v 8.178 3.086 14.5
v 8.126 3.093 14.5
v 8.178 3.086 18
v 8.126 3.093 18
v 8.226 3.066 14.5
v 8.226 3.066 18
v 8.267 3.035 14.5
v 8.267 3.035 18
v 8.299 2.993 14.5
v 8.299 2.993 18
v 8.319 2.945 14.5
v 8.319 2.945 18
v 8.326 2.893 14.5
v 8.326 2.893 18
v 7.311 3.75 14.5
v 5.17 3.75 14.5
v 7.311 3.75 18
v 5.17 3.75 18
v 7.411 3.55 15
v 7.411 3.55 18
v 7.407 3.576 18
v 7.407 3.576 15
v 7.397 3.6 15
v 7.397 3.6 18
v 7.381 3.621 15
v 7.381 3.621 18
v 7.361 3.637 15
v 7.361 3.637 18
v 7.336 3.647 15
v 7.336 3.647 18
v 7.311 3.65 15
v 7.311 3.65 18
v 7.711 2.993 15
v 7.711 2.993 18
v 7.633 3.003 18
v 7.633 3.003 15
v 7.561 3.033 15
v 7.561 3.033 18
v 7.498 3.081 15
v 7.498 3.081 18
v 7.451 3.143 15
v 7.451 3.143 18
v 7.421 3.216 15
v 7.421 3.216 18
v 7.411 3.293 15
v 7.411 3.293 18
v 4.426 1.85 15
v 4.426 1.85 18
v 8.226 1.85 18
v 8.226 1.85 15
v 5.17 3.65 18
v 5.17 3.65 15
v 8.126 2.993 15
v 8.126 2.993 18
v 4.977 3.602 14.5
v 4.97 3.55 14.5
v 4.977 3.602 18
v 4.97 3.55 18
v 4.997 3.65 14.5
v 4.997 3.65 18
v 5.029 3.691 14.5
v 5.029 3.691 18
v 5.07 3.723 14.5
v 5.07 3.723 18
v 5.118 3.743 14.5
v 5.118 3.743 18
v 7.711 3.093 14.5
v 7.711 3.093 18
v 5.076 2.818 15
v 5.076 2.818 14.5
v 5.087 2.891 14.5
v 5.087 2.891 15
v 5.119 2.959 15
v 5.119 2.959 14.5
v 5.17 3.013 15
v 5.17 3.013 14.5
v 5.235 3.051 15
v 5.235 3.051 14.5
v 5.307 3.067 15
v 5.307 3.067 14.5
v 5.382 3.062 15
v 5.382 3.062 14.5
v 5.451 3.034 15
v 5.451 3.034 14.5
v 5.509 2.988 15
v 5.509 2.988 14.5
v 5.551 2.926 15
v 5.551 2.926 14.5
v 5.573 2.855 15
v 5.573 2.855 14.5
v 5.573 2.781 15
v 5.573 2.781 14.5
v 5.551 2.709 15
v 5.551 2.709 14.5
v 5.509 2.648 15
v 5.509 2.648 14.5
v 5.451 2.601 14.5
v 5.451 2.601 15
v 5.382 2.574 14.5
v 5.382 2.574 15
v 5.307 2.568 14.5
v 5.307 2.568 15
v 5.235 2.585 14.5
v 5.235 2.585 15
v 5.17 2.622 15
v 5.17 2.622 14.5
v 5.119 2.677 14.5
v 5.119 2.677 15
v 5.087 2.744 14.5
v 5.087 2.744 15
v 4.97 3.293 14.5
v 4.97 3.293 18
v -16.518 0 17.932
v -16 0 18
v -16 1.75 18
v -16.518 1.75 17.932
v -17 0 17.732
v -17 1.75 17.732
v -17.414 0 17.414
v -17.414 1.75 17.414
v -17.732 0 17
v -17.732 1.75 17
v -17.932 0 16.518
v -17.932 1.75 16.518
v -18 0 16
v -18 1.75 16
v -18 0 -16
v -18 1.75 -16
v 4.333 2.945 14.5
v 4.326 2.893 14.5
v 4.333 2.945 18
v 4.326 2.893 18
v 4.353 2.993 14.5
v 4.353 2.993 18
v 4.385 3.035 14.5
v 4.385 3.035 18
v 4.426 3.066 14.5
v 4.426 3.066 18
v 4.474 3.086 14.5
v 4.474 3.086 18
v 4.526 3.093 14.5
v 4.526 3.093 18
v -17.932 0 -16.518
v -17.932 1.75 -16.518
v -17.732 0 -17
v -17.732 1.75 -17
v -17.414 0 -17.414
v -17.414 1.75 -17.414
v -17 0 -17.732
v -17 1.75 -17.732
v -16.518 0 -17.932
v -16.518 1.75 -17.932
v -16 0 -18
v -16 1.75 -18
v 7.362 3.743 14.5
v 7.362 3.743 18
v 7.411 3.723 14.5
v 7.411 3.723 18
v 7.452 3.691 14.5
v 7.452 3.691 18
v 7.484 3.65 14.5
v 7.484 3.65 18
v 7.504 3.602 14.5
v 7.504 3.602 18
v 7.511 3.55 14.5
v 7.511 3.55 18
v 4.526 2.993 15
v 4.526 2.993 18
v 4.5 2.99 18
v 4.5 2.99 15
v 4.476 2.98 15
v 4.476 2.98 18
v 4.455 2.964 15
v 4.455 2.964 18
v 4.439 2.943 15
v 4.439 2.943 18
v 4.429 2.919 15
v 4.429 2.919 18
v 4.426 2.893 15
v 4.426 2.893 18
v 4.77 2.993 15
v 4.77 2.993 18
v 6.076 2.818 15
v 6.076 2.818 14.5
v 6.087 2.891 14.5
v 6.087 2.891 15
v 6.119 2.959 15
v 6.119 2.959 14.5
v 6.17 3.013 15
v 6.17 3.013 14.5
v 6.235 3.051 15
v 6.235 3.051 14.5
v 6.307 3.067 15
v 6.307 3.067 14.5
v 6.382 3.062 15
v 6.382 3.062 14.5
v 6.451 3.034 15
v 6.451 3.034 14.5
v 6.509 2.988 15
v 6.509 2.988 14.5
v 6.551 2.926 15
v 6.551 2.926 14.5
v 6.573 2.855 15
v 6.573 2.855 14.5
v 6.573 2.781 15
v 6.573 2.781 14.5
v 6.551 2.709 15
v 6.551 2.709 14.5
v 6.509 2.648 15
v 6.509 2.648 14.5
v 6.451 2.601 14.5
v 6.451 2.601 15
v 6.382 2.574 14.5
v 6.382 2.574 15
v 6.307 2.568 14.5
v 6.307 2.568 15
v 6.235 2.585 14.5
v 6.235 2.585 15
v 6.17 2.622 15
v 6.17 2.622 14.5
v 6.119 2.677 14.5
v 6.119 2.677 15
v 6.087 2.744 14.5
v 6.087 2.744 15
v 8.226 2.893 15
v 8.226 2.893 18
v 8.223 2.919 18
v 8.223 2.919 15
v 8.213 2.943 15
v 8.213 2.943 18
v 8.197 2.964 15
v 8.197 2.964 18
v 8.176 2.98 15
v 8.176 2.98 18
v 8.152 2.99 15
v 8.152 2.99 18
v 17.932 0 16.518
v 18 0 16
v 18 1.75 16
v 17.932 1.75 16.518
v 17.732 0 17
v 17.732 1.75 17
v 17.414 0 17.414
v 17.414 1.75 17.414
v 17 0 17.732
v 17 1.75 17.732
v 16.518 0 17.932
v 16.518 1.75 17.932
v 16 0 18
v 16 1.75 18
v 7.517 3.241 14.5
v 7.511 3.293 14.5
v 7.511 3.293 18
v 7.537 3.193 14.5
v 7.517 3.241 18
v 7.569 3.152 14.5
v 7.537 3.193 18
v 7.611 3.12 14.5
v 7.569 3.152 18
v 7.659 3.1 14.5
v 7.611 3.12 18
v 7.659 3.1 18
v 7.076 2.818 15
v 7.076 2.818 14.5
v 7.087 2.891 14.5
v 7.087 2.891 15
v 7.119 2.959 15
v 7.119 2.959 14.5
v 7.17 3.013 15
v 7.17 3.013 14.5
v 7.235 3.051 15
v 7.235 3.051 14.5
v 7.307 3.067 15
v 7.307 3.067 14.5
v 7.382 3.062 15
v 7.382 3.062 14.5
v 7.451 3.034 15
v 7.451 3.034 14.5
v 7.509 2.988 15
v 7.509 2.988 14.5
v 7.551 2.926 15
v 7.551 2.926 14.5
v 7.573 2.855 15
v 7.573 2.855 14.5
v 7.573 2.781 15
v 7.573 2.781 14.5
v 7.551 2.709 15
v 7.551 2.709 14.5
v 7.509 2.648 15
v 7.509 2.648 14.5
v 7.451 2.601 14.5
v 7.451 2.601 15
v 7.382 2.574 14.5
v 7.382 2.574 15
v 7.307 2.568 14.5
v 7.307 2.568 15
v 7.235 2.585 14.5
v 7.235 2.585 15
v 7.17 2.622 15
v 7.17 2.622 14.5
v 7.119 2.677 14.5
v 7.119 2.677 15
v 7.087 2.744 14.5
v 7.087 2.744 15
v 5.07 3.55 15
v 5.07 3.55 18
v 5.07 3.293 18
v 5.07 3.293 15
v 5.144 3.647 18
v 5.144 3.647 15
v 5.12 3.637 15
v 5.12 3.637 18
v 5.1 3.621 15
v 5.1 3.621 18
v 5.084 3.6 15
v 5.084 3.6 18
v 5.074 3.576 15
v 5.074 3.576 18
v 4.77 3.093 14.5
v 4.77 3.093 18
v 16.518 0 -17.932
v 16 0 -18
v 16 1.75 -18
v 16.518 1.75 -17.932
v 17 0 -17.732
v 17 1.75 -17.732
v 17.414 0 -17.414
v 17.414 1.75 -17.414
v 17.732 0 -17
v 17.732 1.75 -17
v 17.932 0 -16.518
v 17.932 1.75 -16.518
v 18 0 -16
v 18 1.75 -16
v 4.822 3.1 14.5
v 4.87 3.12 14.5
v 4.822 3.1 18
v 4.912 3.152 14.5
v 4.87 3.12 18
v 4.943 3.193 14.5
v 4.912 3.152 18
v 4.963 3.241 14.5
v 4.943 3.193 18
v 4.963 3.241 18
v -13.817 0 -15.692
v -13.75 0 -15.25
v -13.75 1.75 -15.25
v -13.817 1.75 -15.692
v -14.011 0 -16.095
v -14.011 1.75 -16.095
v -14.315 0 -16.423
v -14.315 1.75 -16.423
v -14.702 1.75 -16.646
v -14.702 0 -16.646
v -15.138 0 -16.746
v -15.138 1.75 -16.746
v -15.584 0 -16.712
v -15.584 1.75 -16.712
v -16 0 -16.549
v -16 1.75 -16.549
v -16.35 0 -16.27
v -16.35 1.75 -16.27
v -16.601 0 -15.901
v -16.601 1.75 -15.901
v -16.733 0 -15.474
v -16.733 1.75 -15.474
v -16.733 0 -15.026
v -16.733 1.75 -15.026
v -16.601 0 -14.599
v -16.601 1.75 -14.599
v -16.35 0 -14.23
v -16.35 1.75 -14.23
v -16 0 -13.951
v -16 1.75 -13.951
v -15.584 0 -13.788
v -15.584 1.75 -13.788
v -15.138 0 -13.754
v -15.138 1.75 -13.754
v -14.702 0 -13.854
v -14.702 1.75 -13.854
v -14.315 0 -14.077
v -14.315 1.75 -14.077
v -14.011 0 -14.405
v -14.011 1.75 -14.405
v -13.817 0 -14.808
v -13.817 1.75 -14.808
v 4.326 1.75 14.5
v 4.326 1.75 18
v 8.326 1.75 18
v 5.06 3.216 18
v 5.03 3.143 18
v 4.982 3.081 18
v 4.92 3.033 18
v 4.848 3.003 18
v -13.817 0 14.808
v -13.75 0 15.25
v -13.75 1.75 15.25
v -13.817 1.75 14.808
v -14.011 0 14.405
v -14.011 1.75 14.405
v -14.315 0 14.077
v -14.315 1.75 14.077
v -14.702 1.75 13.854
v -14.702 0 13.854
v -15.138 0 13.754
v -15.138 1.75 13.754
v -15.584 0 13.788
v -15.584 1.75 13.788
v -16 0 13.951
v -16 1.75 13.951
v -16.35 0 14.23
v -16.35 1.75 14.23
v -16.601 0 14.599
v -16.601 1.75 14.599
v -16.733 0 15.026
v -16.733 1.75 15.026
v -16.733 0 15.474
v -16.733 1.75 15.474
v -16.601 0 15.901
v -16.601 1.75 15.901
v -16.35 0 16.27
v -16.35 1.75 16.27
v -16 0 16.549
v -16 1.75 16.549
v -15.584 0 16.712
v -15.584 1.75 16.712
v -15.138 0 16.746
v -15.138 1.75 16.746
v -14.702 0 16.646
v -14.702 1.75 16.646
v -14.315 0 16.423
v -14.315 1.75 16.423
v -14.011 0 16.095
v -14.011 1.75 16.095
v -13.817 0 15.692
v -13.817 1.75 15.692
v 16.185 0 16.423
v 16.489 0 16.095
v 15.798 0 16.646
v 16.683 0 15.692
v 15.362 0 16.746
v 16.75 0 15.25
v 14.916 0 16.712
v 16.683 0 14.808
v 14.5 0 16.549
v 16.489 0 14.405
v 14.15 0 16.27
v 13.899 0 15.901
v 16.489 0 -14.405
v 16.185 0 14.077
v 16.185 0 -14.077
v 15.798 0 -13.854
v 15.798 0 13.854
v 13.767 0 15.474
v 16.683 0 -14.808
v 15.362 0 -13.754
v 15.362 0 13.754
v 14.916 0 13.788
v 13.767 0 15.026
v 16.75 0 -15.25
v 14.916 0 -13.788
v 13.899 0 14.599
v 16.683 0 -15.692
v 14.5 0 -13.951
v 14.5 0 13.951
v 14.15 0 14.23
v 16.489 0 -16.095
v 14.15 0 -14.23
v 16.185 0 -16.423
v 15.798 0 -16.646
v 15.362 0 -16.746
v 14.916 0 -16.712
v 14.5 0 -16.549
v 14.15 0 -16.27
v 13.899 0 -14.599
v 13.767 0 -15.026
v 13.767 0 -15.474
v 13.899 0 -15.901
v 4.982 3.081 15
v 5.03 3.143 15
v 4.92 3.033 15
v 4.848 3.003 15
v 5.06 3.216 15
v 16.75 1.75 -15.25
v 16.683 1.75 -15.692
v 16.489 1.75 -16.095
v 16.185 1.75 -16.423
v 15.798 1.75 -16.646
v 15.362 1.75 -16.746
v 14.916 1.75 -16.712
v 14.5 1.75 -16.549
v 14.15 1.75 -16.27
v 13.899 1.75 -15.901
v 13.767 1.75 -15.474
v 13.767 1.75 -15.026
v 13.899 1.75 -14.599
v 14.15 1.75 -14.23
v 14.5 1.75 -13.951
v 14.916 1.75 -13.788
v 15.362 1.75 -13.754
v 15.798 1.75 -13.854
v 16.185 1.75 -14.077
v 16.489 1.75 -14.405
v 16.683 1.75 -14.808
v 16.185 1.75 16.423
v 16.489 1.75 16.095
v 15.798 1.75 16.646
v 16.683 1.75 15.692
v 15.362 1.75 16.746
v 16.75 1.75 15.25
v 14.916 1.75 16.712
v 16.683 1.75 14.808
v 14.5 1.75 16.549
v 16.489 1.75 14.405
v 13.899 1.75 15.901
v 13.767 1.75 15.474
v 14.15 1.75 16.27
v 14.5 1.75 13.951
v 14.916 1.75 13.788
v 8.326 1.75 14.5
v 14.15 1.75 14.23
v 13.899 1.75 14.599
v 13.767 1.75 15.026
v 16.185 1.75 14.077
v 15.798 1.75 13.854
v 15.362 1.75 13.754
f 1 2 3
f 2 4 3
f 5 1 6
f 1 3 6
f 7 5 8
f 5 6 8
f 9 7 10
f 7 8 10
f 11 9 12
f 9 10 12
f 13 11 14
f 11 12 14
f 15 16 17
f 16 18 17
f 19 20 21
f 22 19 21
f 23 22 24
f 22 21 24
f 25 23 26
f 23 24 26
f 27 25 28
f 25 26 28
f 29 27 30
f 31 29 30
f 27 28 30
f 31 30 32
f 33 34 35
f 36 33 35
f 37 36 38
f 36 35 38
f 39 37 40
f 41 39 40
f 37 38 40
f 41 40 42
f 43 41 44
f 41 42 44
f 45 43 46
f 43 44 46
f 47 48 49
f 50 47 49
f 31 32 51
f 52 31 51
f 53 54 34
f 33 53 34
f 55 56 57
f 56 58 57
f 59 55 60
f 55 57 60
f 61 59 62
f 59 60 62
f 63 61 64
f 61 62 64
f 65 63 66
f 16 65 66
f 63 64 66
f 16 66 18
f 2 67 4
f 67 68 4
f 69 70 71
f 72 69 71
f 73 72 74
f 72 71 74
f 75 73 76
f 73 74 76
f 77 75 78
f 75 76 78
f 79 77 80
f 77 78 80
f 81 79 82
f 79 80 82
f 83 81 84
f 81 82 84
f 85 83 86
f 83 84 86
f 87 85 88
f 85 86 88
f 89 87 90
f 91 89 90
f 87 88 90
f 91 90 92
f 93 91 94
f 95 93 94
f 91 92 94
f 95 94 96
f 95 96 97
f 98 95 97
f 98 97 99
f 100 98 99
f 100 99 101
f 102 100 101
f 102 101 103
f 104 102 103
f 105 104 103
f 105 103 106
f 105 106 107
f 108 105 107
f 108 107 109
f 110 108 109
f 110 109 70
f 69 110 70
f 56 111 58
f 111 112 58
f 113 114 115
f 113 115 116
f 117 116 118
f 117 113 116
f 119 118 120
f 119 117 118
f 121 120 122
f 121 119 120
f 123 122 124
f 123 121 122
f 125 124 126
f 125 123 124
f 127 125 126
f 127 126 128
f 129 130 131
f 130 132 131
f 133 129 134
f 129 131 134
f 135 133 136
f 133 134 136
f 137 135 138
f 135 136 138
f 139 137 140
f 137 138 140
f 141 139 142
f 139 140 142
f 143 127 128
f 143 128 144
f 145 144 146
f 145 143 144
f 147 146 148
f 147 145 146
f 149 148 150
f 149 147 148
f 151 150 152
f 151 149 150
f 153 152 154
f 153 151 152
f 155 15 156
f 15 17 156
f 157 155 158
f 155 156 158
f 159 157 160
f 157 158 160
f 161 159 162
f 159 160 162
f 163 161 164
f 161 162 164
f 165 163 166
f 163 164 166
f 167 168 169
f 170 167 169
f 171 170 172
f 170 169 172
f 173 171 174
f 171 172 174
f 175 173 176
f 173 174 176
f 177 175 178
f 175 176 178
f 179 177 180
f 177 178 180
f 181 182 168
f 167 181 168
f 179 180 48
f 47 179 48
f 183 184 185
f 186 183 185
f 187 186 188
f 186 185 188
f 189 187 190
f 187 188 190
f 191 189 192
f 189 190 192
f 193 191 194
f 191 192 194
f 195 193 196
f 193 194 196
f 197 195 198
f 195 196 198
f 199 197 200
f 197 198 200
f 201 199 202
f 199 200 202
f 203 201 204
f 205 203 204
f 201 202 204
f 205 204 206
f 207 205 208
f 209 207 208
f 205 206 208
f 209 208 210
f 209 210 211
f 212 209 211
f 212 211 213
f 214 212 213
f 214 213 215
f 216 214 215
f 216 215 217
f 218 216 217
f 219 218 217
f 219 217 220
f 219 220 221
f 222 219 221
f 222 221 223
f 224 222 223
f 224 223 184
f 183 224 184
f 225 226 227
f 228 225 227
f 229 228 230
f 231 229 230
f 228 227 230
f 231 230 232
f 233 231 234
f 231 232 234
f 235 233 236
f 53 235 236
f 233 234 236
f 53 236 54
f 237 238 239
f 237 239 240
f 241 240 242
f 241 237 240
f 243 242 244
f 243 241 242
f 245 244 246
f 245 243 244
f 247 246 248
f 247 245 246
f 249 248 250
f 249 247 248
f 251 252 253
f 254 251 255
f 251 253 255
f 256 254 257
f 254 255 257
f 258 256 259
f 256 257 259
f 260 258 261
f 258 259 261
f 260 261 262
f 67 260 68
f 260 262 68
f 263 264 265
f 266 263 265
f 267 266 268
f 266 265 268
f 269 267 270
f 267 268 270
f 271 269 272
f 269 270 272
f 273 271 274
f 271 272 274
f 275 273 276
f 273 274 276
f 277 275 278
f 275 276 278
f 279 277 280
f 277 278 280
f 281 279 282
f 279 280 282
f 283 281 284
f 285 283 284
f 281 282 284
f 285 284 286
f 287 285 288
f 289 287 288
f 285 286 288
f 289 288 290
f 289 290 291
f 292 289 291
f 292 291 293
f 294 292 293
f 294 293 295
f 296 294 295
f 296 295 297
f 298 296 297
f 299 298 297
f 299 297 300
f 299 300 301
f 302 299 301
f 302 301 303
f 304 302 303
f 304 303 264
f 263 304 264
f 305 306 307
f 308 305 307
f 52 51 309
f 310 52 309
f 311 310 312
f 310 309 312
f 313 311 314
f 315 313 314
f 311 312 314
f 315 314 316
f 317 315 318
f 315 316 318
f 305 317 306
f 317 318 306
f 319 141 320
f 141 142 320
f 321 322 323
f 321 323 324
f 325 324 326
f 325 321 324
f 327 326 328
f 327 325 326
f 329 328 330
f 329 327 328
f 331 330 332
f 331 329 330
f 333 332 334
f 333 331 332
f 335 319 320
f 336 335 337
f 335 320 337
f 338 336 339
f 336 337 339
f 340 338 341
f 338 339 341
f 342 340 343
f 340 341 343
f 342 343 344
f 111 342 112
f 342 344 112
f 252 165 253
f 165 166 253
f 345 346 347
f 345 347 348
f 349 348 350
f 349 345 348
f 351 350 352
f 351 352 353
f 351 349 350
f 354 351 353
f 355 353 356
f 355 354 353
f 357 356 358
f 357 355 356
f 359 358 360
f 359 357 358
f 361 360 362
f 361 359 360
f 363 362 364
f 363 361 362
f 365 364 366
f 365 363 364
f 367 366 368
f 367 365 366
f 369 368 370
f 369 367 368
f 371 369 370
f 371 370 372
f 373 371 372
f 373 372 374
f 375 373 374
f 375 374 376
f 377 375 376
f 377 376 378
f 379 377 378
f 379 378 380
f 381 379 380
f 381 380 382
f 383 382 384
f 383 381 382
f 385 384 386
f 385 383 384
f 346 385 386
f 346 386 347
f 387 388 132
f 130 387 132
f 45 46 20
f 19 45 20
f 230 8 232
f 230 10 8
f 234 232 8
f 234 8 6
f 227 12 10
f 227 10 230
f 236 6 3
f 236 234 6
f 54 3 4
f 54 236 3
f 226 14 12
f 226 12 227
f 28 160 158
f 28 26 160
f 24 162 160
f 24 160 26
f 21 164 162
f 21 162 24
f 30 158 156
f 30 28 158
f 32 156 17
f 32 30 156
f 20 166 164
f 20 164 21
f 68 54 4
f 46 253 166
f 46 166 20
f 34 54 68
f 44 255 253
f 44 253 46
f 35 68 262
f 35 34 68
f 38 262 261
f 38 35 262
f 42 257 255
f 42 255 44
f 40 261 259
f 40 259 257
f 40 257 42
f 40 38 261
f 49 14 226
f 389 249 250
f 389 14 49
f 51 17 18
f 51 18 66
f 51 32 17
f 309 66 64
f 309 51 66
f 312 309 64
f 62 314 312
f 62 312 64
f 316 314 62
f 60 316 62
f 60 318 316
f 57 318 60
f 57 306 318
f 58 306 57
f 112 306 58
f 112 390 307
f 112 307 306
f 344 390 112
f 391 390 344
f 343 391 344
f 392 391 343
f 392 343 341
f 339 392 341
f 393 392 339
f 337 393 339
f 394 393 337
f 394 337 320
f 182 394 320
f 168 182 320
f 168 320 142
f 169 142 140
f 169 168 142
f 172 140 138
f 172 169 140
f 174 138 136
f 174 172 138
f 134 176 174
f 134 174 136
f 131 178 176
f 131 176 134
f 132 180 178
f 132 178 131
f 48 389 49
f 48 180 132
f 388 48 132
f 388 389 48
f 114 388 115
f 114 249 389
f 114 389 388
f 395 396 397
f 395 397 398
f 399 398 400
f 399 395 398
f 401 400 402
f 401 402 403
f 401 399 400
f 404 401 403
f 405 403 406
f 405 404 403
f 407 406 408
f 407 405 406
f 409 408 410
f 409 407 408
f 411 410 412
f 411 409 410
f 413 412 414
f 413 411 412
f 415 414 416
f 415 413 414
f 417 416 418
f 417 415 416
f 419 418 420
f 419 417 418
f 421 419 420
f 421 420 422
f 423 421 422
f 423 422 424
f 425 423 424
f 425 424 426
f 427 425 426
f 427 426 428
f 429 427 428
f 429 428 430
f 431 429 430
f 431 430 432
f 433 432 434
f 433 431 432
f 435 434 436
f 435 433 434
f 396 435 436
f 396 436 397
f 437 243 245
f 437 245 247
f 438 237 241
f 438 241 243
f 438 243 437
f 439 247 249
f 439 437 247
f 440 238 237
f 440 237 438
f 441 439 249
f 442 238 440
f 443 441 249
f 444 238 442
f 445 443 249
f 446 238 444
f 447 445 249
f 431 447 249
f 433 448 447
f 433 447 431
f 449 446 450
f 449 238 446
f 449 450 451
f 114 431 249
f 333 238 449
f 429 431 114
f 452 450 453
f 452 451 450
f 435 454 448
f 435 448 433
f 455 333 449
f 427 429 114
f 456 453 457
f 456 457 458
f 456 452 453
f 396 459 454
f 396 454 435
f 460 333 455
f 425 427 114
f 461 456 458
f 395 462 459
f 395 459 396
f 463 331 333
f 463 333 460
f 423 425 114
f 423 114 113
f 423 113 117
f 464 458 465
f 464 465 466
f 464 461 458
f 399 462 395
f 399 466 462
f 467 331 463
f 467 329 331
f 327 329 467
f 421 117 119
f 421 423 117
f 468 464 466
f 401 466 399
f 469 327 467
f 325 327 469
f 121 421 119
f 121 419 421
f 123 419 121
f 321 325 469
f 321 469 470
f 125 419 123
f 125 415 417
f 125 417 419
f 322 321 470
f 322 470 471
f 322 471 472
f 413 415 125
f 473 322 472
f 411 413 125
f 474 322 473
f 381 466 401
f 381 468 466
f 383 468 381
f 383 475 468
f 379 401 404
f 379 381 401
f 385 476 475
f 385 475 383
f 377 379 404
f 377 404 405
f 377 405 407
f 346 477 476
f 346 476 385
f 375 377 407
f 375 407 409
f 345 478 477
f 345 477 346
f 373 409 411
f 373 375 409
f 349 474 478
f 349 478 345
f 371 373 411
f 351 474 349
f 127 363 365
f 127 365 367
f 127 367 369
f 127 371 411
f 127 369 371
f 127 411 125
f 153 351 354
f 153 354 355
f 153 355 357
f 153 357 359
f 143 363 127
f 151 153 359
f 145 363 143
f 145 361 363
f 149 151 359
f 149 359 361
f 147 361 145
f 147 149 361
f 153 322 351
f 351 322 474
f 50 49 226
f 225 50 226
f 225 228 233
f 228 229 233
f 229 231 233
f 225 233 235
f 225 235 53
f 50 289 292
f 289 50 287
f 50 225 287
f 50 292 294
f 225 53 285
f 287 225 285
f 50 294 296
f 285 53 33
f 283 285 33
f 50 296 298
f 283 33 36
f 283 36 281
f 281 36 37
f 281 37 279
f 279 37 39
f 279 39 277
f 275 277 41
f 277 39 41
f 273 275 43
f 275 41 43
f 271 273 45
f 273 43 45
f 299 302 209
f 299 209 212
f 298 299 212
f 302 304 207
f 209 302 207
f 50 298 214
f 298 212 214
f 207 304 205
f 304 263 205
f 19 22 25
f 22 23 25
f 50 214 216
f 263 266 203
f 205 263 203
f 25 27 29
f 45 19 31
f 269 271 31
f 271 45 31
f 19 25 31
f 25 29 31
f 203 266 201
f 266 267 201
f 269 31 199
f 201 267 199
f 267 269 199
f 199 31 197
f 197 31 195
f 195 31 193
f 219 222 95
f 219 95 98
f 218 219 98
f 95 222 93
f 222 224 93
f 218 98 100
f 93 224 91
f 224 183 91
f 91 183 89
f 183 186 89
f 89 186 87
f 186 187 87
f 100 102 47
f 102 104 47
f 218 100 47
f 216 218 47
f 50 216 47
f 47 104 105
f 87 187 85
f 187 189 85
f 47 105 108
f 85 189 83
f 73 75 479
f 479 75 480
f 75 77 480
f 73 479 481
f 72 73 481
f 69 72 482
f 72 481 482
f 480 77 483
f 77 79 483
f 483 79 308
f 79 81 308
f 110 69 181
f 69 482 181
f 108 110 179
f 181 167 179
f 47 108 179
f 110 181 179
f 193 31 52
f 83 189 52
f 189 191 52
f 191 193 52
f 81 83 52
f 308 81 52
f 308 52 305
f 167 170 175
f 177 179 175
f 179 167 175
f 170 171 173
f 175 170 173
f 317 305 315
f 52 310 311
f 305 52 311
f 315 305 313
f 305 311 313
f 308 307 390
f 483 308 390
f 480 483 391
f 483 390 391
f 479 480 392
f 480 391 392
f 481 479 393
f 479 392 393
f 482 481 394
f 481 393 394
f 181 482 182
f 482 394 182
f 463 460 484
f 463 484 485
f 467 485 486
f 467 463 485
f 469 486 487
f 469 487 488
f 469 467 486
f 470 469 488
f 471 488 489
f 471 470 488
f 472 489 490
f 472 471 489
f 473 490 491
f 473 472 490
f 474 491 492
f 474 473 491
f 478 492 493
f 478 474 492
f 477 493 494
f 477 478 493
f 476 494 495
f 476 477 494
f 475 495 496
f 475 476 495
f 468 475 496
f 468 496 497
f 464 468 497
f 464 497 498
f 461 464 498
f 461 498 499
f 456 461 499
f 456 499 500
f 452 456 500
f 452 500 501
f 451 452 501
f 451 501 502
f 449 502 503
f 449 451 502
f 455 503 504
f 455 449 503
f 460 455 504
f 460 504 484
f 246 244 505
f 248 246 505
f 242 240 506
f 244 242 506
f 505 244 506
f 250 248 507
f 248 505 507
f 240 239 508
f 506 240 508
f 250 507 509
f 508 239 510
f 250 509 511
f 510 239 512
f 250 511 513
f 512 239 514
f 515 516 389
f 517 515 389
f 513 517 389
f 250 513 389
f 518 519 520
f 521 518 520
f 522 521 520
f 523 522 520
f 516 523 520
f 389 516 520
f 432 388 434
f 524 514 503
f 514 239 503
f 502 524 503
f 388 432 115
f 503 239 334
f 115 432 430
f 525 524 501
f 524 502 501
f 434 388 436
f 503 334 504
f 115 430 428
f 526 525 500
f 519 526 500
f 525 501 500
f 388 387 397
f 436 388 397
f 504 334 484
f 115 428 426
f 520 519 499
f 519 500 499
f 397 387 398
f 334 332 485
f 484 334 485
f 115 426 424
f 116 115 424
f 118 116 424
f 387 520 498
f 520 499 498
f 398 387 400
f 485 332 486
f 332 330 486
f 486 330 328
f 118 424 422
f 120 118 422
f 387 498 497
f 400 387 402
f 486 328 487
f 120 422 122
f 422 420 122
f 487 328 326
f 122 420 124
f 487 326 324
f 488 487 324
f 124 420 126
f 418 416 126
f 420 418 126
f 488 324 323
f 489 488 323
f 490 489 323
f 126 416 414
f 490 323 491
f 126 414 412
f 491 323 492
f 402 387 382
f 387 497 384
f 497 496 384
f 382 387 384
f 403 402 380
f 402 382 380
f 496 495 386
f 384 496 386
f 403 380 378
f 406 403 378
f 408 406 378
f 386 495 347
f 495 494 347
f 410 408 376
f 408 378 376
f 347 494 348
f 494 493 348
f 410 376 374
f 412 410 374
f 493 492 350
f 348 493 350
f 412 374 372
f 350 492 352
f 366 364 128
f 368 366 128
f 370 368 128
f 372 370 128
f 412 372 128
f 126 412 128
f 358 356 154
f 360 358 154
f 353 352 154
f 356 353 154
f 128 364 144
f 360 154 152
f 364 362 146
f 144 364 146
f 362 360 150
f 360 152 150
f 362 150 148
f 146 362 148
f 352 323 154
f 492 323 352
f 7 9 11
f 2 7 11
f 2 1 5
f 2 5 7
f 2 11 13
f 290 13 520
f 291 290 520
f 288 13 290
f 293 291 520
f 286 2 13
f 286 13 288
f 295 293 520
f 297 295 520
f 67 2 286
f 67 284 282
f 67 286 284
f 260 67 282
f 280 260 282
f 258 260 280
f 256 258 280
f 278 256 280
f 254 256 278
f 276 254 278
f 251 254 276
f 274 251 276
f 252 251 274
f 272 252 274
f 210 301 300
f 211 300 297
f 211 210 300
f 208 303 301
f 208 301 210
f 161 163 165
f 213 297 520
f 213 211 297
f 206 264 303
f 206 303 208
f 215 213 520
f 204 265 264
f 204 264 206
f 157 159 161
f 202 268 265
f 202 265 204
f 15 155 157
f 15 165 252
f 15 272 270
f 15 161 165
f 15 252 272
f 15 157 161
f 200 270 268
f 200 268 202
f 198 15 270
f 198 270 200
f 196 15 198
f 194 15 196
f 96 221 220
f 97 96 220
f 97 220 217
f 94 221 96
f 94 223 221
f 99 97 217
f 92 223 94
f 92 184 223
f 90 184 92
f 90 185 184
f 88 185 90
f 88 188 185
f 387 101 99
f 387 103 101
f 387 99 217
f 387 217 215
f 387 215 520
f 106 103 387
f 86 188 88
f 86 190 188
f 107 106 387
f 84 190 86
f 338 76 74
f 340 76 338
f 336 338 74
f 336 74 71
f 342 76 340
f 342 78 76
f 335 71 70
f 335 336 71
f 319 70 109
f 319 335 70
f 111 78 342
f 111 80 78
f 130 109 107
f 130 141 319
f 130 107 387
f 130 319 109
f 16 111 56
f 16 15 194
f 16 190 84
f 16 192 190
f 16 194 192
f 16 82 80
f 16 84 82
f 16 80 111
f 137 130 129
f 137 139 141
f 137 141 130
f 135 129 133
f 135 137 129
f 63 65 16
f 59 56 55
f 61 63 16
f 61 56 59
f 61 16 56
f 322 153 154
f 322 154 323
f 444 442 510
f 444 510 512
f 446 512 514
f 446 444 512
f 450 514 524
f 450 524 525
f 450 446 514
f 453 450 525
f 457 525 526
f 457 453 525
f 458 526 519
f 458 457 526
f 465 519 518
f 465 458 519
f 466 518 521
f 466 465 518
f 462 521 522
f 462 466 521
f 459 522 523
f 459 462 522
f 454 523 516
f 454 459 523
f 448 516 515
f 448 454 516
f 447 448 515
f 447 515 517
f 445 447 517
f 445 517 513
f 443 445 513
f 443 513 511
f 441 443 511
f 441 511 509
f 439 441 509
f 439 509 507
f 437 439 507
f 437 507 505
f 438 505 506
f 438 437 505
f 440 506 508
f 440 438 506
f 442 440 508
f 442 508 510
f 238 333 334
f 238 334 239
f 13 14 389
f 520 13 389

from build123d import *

# Parameters (mm, degrees)
SKETCH1_R           = 1.5
BOSS_EXTRUDE1_DEPTH = 1.75
BOSS_EXTRUDE2_DEPTH = 3
BOSS_EXTRUDE3_DEPTH = 0.5
CUT_EXTRUDE1_REACH  = 5.5
SKETCH4_R           = 0.25


with BuildPart() as part:
    # Sketch1 → Boss-Extrude1 (new body)
    with BuildSketch(Plane(origin=(0, 0, 0), x_dir=(1, 0, 0), z_dir=(0, 1, 0))):
        with BuildLine():
            Line((16, -18), (-16, -18))
            ThreePointArc((-16, -18), (-17.414213562, -17.414213562), (-18, -16))
            Line((-18, -16), (-18, 16))
            ThreePointArc((-18, 16), (-17.414213562, 17.414213562), (-16, 18))
            Line((-16, 18), (16, 18))
            ThreePointArc((16, 18), (17.414213562, 17.414213562), (18, 16))
            Line((18, 16), (18, -16))
            ThreePointArc((18, -16), (17.414213562, -17.414213562), (16, -18))
        make_face()
        with Locations((-15.25, 15.25)):
            Circle(SKETCH1_R, mode=Mode.SUBTRACT)
        with Locations((15.25, 15.25)):
            Circle(SKETCH1_R, mode=Mode.SUBTRACT)
        with Locations((15.25, -15.25)):
            Circle(SKETCH1_R, mode=Mode.SUBTRACT)
        with Locations((-15.25, -15.25)):
            Circle(SKETCH1_R, mode=Mode.SUBTRACT)
    extrude(amount=BOSS_EXTRUDE1_DEPTH)

    # Sketch2 → Boss-Extrude2 (add)
    with BuildSketch(Plane.XY.offset(18)):
        with BuildLine():
            Line((4.325932744, 1.75), (8.325932744, 1.75))
            Line((8.325932744, 1.75), (8.325932744, 2.893191045))
            ThreePointArc((8.325932744, 2.893191045), (8.2673541, 3.034612401), (8.125932744, 3.093191045))
            Line((8.125932744, 3.093191045), (7.710555572, 3.093191045))
            ThreePointArc((7.710555572, 3.093191045), (7.569134216, 3.151769689), (7.510555572, 3.293191045))
            Line((7.510555572, 3.293191045), (7.510555572, 3.55))
            ThreePointArc((7.510555572, 3.55), (7.451976928, 3.691421356), (7.310555572, 3.75))
            Line((7.310555572, 3.75), (5.170220599, 3.75))
            ThreePointArc((5.170220599, 3.75), (5.028799243, 3.691421356), (4.970220599, 3.55))
            Line((4.970220599, 3.55), (4.970220599, 3.293191045))
            ThreePointArc((4.970220599, 3.293191045), (4.911641955, 3.151769689), (4.770220599, 3.093191045))
            Line((4.770220599, 3.093191045), (4.525932744, 3.093191045))
            ThreePointArc((4.525932744, 3.093191045), (4.384511387, 3.034612401), (4.325932744, 2.893191045))
            Line((4.325932744, 2.893191045), (4.325932744, 1.75))
        make_face()
        with BuildLine():
            Line((4.425932744, 1.85), (8.225932744, 1.85))
            Line((8.225932744, 1.85), (8.225932744, 2.893191045))
            ThreePointArc((8.225932744, 2.893191045), (8.196643422, 2.963901723), (8.125932744, 2.993191045))
            Line((8.125932744, 2.993191045), (7.710555572, 2.993191045))
            ThreePointArc((7.710555572, 2.993191045), (7.498423538, 3.081059011), (7.410555572, 3.293191045))
            Line((7.410555572, 3.293191045), (7.410555572, 3.55))
            ThreePointArc((7.410555572, 3.55), (7.38126625, 3.620710678), (7.310555572, 3.65))
            Line((7.310555572, 3.65), (5.170220599, 3.65))
            ThreePointArc((5.170220599, 3.65), (5.099509921, 3.620710678), (5.070220599, 3.55))
            Line((5.070220599, 3.55), (5.070220599, 3.293191045))
            ThreePointArc((5.070220599, 3.293191045), (4.982352633, 3.081059011), (4.770220599, 2.993191045))
            Line((4.770220599, 2.993191045), (4.525932744, 2.993191045))
            ThreePointArc((4.525932744, 2.993191045), (4.455222065, 2.963901723), (4.425932744, 2.893191045))
            Line((4.425932744, 2.893191045), (4.425932744, 1.85))
        make_face(mode=Mode.SUBTRACT)
    extrude(amount=-BOSS_EXTRUDE2_DEPTH)

    # Sketch3 → Boss-Extrude3 (add)
    with BuildSketch(Plane(origin=(0, 0, 15), x_dir=(-1, 0, 0), z_dir=(0, 0, -1))):
        with BuildLine():
            Line((-4.325932744, 1.75), (-4.325932744, 2.893191045))
            ThreePointArc((-4.325932744, 2.893191045), (-4.384511387, 3.034612401), (-4.525932744, 3.093191045))
            Line((-4.525932744, 3.093191045), (-4.770220599, 3.093191045))
            ThreePointArc((-4.770220599, 3.093191045), (-4.911641955, 3.151769689), (-4.970220599, 3.293191045))
            Line((-4.970220599, 3.293191045), (-4.970220599, 3.55))
            ThreePointArc((-4.970220599, 3.55), (-5.028799243, 3.691421356), (-5.170220599, 3.75))
            Line((-5.170220599, 3.75), (-7.310555572, 3.75))
            ThreePointArc((-7.310555572, 3.75), (-7.451976928, 3.691421356), (-7.510555572, 3.55))
            Line((-7.510555572, 3.55), (-7.510555572, 3.293191045))
            ThreePointArc((-7.510555572, 3.293191045), (-7.569134216, 3.151769689), (-7.710555572, 3.093191045))
            Line((-7.710555572, 3.093191045), (-8.125932744, 3.093191045))
            ThreePointArc((-8.125932744, 3.093191045), (-8.2673541, 3.034612401), (-8.325932744, 2.893191045))
            Line((-8.325932744, 2.893191045), (-8.325932744, 1.75))
            Line((-8.325932744, 1.75), (-4.325932744, 1.75))
        make_face()
    extrude(amount=BOSS_EXTRUDE3_DEPTH)

    # Sketch4 → Cut-Extrude1 (cut, up to next)
    with BuildSketch(Plane(origin=(0, 0, 14.5), x_dir=(-1, 0, 0), z_dir=(0, 0, -1)), mode=Mode.PRIVATE) as cut_extrude1_sk1:
        with Locations((-7.325932744, 2.817782328)):
            Circle(SKETCH4_R)
    cut_extrude1_tool1 = extrude(cut_extrude1_sk1.sketch, amount=-CUT_EXTRUDE1_REACH, mode=Mode.PRIVATE) & part.part
    add(cut_extrude1_tool1.solids().sort_by_distance((7.325933, 2.817782, 14.5))[0], mode=Mode.SUBTRACT)
    # Sketch4 → Cut-Extrude1 (cut, up to next)
    with BuildSketch(Plane(origin=(0, 0, 14.5), x_dir=(-1, 0, 0), z_dir=(0, 0, -1)), mode=Mode.PRIVATE) as cut_extrude1_sk2:
        with Locations((-6.325932744, 2.817782328)):
            Circle(SKETCH4_R)
    cut_extrude1_tool2 = extrude(cut_extrude1_sk2.sketch, amount=-CUT_EXTRUDE1_REACH, mode=Mode.PRIVATE) & part.part
    add(cut_extrude1_tool2.solids().sort_by_distance((6.325933, 2.817782, 14.5))[0], mode=Mode.SUBTRACT)
    # Sketch4 → Cut-Extrude1 (cut, up to next)
    with BuildSketch(Plane(origin=(0, 0, 14.5), x_dir=(-1, 0, 0), z_dir=(0, 0, -1)), mode=Mode.PRIVATE) as cut_extrude1_sk3:
        with Locations((-5.325932744, 2.817782328)):
            Circle(SKETCH4_R)
    cut_extrude1_tool3 = extrude(cut_extrude1_sk3.sketch, amount=-CUT_EXTRUDE1_REACH, mode=Mode.PRIVATE) & part.part
    add(cut_extrude1_tool3.solids().sort_by_distance((5.325933, 2.817782, 14.5))[0], mode=Mode.SUBTRACT)


solid = part.part
